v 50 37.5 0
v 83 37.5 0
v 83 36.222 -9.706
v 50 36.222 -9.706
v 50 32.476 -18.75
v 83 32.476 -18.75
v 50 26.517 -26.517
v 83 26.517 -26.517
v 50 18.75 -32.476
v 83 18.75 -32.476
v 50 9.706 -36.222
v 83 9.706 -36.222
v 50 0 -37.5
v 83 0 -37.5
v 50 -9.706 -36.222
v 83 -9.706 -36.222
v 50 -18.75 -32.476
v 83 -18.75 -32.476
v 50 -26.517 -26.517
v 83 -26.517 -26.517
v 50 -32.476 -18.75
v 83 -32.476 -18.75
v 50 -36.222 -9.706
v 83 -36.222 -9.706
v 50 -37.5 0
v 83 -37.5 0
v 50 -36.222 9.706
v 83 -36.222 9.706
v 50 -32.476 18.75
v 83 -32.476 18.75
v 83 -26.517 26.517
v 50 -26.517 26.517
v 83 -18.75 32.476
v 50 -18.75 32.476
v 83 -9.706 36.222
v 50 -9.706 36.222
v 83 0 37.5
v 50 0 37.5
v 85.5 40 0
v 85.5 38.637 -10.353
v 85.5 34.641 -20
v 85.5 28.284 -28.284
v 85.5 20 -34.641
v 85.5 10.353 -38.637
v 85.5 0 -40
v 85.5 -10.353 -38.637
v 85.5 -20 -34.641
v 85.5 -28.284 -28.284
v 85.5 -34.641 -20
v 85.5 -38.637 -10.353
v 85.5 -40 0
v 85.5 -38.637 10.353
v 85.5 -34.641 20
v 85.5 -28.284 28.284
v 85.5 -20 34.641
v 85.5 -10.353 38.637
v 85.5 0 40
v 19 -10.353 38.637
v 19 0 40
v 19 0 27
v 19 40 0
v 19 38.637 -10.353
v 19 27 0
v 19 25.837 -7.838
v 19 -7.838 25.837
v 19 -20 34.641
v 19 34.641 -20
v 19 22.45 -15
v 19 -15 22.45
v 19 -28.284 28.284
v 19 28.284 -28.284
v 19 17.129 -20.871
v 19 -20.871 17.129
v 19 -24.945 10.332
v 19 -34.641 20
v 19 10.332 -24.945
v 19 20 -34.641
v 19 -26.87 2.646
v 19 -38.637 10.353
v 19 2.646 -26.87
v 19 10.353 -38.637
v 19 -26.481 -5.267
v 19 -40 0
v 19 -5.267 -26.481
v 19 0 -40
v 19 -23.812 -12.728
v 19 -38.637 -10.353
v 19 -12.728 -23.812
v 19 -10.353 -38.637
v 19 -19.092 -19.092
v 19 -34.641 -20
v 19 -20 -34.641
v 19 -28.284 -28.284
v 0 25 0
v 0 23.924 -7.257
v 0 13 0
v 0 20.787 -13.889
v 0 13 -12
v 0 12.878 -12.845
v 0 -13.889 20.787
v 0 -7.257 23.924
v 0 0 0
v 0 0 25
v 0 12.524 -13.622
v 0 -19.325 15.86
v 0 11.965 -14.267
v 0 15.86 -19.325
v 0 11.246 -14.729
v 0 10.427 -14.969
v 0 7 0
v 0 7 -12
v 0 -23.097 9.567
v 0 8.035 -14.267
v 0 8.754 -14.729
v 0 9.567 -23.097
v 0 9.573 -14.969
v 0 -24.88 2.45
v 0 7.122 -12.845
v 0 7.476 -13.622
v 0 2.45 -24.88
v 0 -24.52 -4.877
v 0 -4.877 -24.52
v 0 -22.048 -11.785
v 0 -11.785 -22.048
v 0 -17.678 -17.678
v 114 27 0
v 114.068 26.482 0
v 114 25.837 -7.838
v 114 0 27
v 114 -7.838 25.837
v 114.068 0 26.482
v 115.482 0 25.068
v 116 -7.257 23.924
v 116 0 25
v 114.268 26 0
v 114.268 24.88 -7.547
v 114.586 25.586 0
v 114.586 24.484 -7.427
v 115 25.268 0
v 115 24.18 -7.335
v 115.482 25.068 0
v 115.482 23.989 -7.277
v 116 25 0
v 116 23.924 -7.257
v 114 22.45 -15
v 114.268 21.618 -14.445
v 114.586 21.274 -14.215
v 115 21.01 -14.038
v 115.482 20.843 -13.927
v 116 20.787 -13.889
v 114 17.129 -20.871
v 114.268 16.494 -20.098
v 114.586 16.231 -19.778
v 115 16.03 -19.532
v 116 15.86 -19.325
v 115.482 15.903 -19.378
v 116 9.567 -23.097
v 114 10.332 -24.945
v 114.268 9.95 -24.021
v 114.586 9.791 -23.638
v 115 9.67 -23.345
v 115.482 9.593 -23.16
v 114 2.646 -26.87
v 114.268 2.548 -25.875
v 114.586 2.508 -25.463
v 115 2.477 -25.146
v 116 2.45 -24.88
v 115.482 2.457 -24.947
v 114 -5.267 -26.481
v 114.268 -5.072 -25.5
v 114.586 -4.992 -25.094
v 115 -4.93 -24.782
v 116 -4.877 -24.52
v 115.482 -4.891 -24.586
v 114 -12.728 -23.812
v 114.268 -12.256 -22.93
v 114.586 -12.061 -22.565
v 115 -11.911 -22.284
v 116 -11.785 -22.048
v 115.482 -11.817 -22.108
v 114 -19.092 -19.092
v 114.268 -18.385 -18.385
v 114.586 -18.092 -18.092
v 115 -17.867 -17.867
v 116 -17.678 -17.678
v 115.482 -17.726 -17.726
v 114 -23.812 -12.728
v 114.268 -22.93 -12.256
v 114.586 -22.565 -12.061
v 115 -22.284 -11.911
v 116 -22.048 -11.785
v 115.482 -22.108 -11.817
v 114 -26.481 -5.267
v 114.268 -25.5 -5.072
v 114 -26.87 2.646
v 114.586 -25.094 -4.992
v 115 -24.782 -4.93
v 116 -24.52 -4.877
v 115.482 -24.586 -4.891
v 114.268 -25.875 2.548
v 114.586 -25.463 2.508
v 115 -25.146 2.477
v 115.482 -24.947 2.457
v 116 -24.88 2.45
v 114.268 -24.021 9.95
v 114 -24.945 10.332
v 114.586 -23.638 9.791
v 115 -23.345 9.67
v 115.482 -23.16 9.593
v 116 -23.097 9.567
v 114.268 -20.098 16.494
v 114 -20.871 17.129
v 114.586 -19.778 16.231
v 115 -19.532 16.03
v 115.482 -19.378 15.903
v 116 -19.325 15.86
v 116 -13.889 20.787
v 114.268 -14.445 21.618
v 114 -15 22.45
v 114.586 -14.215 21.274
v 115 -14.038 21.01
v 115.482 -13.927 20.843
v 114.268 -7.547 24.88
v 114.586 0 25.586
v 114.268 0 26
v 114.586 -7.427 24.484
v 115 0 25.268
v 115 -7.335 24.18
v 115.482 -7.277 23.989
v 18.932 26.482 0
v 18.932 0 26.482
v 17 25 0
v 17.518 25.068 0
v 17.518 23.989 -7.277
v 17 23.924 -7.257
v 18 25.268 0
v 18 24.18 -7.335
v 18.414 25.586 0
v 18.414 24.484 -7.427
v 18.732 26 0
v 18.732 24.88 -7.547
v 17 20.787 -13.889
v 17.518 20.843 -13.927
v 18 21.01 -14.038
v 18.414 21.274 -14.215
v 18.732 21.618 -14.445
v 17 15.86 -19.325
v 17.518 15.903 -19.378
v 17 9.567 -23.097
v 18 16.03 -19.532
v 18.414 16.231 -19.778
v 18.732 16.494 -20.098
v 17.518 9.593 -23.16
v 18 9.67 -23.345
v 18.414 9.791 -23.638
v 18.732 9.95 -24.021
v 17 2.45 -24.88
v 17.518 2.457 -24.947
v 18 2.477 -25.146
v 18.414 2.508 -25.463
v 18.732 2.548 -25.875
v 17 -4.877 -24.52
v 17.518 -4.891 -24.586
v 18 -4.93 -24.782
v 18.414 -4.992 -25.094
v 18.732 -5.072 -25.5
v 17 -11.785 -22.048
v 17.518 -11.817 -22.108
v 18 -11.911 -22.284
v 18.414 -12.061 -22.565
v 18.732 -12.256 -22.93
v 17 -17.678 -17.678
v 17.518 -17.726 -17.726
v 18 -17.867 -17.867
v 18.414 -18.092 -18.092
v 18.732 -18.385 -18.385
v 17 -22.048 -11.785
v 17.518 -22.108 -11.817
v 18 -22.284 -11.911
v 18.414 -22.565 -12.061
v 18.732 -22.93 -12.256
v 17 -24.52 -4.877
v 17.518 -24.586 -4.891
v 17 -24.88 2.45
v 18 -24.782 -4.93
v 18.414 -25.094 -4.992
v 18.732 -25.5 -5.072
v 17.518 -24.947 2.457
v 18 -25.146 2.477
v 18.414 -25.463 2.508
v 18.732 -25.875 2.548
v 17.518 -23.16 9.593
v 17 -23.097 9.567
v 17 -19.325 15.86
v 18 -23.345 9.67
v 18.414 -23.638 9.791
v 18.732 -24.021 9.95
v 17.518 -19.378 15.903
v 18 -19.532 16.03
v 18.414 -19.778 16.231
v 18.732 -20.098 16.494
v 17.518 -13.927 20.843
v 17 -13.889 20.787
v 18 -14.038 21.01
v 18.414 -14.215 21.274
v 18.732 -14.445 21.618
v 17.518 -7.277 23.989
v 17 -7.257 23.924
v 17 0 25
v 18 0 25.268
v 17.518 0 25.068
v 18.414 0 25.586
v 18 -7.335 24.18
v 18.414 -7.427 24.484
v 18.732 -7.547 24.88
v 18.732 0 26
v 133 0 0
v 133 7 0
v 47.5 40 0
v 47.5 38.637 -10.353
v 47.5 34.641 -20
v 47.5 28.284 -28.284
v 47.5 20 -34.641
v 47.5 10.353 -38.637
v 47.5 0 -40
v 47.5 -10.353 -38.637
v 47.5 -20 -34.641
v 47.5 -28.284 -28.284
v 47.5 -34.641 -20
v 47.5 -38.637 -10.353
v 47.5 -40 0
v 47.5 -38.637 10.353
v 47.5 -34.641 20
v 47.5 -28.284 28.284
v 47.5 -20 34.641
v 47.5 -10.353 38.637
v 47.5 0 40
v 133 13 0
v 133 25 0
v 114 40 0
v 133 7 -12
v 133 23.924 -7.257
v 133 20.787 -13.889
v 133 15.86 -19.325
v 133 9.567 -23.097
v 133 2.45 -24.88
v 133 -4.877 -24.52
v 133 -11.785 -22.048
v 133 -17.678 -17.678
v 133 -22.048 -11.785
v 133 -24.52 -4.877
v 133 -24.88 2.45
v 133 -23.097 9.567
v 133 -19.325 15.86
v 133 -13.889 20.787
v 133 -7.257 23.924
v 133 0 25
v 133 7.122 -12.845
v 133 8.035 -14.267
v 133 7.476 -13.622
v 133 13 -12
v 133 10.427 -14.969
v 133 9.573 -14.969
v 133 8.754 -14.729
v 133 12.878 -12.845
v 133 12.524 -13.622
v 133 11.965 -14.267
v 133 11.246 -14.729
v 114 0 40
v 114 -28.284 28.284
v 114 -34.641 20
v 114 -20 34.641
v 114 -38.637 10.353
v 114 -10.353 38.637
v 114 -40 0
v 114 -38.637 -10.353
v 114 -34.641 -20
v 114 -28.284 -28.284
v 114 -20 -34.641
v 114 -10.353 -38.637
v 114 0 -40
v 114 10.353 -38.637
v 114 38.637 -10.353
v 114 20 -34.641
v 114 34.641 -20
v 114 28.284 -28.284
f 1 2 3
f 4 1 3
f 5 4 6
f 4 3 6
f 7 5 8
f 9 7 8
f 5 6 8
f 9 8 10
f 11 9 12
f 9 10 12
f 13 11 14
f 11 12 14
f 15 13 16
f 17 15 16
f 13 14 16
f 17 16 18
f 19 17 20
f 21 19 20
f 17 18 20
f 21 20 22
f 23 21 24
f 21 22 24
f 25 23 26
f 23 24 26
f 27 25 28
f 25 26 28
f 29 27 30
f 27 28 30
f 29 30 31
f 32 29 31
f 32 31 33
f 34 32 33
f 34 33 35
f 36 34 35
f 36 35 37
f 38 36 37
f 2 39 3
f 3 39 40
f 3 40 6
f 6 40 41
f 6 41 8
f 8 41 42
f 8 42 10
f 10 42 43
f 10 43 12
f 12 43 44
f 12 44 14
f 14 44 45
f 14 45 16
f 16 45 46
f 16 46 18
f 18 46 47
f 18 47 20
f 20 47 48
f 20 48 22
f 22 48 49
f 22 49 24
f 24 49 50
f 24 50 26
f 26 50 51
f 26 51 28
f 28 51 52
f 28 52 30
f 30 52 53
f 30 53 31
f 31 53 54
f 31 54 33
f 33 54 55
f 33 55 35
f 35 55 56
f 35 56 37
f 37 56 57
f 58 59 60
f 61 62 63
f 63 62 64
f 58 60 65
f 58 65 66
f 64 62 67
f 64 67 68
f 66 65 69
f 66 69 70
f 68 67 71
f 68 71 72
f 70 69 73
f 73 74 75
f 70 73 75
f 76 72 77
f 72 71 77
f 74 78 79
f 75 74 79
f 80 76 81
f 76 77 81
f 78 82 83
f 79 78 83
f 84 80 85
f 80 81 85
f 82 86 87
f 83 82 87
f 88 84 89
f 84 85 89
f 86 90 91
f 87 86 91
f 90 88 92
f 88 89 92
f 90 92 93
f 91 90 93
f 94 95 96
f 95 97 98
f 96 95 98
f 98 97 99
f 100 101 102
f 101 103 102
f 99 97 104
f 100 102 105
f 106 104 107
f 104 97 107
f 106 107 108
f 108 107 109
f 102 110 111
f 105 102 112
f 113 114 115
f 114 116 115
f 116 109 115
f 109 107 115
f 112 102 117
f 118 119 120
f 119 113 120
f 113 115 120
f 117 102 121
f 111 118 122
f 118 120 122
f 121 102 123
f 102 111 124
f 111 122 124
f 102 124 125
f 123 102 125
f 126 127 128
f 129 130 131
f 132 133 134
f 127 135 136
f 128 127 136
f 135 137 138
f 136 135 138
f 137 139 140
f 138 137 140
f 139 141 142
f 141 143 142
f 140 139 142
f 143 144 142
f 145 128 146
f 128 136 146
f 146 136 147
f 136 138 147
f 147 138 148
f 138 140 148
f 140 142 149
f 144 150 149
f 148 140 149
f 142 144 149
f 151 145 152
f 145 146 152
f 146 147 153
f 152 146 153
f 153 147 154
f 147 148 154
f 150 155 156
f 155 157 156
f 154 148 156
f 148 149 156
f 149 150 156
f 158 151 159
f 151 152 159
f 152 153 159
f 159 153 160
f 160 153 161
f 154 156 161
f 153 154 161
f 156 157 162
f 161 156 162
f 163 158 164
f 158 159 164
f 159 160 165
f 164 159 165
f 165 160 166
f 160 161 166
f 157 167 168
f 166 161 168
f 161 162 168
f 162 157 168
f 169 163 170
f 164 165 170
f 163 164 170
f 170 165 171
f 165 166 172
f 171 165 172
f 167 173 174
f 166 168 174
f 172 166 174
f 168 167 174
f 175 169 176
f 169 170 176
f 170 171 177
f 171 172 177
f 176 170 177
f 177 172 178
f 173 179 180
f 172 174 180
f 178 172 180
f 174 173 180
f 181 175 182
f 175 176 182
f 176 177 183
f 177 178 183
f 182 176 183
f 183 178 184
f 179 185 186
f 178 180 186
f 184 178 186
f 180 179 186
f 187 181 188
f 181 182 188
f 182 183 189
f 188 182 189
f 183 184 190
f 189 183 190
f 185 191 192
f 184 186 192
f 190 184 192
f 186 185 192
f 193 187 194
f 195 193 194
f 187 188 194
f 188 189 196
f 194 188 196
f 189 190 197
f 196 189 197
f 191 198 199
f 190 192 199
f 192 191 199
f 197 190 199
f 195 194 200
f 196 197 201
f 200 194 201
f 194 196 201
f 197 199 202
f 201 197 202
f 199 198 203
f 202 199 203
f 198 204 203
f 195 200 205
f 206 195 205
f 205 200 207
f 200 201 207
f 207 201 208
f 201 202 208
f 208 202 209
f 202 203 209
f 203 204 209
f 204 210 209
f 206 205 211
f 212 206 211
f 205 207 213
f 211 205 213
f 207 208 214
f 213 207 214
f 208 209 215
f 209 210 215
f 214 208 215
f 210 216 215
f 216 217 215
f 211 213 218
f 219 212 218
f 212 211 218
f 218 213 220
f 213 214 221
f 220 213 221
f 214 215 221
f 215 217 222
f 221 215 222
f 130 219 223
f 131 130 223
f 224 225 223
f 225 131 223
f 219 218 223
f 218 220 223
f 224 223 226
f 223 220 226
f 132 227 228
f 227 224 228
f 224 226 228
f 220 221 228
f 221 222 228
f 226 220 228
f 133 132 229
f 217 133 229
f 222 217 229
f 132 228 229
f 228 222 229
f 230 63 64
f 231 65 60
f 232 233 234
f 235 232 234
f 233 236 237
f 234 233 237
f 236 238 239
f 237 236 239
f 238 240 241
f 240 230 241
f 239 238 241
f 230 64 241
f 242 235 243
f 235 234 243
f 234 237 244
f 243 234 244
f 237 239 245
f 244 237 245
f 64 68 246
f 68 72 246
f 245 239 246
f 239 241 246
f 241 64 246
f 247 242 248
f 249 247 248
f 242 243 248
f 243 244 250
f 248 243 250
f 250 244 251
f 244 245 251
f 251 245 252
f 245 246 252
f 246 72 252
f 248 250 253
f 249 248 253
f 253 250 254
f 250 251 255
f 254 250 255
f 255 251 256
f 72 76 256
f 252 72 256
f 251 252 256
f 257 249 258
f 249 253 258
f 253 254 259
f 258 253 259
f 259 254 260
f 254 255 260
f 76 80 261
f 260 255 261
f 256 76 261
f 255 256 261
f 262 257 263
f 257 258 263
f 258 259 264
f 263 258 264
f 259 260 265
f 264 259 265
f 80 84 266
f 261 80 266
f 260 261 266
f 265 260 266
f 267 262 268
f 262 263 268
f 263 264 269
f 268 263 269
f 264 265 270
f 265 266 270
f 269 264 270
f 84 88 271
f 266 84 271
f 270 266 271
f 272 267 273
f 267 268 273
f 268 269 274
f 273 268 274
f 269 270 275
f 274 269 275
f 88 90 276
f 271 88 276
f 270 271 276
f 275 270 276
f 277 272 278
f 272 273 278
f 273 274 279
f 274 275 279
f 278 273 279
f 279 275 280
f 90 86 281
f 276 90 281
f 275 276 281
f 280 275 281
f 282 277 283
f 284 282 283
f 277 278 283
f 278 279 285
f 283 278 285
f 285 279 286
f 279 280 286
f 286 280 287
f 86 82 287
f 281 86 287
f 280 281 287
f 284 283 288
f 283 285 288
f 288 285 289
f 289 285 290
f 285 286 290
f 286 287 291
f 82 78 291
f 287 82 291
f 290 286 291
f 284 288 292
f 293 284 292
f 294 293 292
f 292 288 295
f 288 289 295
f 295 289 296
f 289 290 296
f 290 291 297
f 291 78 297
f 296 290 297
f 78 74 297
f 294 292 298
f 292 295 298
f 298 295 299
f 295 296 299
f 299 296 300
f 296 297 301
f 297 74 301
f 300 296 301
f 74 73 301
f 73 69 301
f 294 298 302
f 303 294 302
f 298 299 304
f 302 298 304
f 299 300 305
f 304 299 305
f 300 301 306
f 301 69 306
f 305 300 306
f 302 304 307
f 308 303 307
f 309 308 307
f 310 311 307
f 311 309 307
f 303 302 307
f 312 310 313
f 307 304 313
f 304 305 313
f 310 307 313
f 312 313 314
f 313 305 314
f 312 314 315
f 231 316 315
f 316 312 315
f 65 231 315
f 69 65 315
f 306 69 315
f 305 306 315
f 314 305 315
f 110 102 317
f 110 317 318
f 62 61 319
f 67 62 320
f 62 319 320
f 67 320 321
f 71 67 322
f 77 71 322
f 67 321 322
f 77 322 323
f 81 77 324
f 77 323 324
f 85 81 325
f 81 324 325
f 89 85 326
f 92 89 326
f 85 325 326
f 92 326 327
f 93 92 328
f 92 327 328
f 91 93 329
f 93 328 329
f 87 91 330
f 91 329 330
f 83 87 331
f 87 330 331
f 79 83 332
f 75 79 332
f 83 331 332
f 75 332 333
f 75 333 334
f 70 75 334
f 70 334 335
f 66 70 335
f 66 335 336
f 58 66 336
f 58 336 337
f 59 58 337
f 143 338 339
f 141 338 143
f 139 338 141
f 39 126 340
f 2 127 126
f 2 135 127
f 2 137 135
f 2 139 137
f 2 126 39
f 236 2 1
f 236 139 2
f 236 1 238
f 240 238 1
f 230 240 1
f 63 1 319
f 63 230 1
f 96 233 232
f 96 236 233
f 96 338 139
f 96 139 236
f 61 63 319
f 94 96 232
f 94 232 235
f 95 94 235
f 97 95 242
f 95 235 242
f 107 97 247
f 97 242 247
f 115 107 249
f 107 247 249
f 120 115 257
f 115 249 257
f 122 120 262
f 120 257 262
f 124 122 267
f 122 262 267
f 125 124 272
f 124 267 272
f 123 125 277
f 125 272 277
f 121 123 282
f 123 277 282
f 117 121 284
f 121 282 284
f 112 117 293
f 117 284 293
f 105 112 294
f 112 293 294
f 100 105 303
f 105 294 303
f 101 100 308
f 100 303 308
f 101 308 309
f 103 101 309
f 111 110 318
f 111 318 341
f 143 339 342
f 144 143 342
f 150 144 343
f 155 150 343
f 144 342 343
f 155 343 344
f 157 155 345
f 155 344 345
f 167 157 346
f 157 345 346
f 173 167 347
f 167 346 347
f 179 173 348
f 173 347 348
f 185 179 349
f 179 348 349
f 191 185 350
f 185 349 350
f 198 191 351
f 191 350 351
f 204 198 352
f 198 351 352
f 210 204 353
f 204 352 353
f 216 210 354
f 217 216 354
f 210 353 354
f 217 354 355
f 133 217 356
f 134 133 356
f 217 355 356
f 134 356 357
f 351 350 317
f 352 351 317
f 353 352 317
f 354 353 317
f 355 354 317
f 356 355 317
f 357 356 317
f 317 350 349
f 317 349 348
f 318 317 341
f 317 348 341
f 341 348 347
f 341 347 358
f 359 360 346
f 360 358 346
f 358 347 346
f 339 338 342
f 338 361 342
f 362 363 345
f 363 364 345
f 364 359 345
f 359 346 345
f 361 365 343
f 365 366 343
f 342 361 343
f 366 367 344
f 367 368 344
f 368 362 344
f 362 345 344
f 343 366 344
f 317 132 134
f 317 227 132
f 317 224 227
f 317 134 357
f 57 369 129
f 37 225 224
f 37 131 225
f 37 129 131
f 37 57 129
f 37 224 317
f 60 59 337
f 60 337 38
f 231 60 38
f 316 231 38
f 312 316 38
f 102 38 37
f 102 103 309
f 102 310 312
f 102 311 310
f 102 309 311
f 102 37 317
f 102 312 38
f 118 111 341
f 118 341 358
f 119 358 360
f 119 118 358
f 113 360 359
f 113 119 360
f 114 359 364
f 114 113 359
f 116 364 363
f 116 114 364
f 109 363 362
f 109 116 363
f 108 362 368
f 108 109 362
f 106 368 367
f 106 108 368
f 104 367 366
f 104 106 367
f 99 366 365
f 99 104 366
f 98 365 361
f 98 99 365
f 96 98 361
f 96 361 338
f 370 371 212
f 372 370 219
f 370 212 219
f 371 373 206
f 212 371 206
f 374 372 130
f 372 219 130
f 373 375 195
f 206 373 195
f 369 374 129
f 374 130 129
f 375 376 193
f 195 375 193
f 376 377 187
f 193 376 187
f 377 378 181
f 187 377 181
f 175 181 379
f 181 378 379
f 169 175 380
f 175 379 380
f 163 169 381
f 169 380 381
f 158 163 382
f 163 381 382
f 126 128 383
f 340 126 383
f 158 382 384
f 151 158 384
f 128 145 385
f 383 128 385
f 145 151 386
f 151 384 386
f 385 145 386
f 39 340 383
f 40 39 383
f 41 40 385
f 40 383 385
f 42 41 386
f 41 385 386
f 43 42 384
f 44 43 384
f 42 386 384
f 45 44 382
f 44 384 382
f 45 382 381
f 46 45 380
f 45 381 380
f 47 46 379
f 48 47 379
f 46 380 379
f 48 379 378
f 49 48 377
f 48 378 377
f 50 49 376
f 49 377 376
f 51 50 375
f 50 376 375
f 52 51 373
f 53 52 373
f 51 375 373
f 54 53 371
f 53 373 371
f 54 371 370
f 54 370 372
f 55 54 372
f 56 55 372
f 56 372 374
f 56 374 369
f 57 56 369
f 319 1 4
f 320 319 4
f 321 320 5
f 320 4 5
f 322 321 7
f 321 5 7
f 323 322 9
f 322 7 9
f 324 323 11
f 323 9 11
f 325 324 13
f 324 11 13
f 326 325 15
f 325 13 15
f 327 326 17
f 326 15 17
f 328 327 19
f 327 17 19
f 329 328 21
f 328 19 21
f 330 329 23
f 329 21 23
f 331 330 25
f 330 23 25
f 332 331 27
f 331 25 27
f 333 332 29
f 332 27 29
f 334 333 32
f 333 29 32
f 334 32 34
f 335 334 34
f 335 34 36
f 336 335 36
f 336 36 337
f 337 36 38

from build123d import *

# Parameters (mm, degrees)
ZAOKR_GLENIE1_R            = 2
WYTNIJ_WYCI_GNI_CIE1_DEPTH = 134


with BuildPart() as part:
    # Szkic2 → Obrót1 (revolve)
    with BuildSketch(Plane.XY):
        Polygon((0, 0), (0, 25), (19, 25), (19, 40), (47.5, 40), (50, 37.5), (83, 37.5), (85.5, 40), (114, 40), (114, 25), (133, 25), (133, 0), align=None)
    revolve(axis=Axis((133, 0, 0), (-1, 0, 0)))

    # Zaokrąglenie1
    zaokr_glenie1_edges = [part.edges().sort_by_distance(p)[0] for p in [
        (114, -25, 0),
        (19, -25, 0),
    ]]
    fillet(zaokr_glenie1_edges, radius=ZAOKR_GLENIE1_R)

    # Szkic3 → Wytnij-wyciągnięcie1 (cut, through all)
    with BuildSketch(Plane.ZY):
        with BuildLine():
            Line((0, 0), (0, 7))
            Line((0, 7), (-12, 7))
            ThreePointArc((-12, 7), (-15, 10), (-12, 13))
            Line((-12, 13), (0, 13))
            Line((0, 13), (0, 40))
            ThreePointArc((0, 40), (28.284271247, 28.284271247), (40, 0))
            Line((40, 0), (0, 0))
        make_face()
    extrude(amount=-WYTNIJ_WYCI_GNI_CIE1_DEPTH, mode=Mode.SUBTRACT)


solid = part.part
